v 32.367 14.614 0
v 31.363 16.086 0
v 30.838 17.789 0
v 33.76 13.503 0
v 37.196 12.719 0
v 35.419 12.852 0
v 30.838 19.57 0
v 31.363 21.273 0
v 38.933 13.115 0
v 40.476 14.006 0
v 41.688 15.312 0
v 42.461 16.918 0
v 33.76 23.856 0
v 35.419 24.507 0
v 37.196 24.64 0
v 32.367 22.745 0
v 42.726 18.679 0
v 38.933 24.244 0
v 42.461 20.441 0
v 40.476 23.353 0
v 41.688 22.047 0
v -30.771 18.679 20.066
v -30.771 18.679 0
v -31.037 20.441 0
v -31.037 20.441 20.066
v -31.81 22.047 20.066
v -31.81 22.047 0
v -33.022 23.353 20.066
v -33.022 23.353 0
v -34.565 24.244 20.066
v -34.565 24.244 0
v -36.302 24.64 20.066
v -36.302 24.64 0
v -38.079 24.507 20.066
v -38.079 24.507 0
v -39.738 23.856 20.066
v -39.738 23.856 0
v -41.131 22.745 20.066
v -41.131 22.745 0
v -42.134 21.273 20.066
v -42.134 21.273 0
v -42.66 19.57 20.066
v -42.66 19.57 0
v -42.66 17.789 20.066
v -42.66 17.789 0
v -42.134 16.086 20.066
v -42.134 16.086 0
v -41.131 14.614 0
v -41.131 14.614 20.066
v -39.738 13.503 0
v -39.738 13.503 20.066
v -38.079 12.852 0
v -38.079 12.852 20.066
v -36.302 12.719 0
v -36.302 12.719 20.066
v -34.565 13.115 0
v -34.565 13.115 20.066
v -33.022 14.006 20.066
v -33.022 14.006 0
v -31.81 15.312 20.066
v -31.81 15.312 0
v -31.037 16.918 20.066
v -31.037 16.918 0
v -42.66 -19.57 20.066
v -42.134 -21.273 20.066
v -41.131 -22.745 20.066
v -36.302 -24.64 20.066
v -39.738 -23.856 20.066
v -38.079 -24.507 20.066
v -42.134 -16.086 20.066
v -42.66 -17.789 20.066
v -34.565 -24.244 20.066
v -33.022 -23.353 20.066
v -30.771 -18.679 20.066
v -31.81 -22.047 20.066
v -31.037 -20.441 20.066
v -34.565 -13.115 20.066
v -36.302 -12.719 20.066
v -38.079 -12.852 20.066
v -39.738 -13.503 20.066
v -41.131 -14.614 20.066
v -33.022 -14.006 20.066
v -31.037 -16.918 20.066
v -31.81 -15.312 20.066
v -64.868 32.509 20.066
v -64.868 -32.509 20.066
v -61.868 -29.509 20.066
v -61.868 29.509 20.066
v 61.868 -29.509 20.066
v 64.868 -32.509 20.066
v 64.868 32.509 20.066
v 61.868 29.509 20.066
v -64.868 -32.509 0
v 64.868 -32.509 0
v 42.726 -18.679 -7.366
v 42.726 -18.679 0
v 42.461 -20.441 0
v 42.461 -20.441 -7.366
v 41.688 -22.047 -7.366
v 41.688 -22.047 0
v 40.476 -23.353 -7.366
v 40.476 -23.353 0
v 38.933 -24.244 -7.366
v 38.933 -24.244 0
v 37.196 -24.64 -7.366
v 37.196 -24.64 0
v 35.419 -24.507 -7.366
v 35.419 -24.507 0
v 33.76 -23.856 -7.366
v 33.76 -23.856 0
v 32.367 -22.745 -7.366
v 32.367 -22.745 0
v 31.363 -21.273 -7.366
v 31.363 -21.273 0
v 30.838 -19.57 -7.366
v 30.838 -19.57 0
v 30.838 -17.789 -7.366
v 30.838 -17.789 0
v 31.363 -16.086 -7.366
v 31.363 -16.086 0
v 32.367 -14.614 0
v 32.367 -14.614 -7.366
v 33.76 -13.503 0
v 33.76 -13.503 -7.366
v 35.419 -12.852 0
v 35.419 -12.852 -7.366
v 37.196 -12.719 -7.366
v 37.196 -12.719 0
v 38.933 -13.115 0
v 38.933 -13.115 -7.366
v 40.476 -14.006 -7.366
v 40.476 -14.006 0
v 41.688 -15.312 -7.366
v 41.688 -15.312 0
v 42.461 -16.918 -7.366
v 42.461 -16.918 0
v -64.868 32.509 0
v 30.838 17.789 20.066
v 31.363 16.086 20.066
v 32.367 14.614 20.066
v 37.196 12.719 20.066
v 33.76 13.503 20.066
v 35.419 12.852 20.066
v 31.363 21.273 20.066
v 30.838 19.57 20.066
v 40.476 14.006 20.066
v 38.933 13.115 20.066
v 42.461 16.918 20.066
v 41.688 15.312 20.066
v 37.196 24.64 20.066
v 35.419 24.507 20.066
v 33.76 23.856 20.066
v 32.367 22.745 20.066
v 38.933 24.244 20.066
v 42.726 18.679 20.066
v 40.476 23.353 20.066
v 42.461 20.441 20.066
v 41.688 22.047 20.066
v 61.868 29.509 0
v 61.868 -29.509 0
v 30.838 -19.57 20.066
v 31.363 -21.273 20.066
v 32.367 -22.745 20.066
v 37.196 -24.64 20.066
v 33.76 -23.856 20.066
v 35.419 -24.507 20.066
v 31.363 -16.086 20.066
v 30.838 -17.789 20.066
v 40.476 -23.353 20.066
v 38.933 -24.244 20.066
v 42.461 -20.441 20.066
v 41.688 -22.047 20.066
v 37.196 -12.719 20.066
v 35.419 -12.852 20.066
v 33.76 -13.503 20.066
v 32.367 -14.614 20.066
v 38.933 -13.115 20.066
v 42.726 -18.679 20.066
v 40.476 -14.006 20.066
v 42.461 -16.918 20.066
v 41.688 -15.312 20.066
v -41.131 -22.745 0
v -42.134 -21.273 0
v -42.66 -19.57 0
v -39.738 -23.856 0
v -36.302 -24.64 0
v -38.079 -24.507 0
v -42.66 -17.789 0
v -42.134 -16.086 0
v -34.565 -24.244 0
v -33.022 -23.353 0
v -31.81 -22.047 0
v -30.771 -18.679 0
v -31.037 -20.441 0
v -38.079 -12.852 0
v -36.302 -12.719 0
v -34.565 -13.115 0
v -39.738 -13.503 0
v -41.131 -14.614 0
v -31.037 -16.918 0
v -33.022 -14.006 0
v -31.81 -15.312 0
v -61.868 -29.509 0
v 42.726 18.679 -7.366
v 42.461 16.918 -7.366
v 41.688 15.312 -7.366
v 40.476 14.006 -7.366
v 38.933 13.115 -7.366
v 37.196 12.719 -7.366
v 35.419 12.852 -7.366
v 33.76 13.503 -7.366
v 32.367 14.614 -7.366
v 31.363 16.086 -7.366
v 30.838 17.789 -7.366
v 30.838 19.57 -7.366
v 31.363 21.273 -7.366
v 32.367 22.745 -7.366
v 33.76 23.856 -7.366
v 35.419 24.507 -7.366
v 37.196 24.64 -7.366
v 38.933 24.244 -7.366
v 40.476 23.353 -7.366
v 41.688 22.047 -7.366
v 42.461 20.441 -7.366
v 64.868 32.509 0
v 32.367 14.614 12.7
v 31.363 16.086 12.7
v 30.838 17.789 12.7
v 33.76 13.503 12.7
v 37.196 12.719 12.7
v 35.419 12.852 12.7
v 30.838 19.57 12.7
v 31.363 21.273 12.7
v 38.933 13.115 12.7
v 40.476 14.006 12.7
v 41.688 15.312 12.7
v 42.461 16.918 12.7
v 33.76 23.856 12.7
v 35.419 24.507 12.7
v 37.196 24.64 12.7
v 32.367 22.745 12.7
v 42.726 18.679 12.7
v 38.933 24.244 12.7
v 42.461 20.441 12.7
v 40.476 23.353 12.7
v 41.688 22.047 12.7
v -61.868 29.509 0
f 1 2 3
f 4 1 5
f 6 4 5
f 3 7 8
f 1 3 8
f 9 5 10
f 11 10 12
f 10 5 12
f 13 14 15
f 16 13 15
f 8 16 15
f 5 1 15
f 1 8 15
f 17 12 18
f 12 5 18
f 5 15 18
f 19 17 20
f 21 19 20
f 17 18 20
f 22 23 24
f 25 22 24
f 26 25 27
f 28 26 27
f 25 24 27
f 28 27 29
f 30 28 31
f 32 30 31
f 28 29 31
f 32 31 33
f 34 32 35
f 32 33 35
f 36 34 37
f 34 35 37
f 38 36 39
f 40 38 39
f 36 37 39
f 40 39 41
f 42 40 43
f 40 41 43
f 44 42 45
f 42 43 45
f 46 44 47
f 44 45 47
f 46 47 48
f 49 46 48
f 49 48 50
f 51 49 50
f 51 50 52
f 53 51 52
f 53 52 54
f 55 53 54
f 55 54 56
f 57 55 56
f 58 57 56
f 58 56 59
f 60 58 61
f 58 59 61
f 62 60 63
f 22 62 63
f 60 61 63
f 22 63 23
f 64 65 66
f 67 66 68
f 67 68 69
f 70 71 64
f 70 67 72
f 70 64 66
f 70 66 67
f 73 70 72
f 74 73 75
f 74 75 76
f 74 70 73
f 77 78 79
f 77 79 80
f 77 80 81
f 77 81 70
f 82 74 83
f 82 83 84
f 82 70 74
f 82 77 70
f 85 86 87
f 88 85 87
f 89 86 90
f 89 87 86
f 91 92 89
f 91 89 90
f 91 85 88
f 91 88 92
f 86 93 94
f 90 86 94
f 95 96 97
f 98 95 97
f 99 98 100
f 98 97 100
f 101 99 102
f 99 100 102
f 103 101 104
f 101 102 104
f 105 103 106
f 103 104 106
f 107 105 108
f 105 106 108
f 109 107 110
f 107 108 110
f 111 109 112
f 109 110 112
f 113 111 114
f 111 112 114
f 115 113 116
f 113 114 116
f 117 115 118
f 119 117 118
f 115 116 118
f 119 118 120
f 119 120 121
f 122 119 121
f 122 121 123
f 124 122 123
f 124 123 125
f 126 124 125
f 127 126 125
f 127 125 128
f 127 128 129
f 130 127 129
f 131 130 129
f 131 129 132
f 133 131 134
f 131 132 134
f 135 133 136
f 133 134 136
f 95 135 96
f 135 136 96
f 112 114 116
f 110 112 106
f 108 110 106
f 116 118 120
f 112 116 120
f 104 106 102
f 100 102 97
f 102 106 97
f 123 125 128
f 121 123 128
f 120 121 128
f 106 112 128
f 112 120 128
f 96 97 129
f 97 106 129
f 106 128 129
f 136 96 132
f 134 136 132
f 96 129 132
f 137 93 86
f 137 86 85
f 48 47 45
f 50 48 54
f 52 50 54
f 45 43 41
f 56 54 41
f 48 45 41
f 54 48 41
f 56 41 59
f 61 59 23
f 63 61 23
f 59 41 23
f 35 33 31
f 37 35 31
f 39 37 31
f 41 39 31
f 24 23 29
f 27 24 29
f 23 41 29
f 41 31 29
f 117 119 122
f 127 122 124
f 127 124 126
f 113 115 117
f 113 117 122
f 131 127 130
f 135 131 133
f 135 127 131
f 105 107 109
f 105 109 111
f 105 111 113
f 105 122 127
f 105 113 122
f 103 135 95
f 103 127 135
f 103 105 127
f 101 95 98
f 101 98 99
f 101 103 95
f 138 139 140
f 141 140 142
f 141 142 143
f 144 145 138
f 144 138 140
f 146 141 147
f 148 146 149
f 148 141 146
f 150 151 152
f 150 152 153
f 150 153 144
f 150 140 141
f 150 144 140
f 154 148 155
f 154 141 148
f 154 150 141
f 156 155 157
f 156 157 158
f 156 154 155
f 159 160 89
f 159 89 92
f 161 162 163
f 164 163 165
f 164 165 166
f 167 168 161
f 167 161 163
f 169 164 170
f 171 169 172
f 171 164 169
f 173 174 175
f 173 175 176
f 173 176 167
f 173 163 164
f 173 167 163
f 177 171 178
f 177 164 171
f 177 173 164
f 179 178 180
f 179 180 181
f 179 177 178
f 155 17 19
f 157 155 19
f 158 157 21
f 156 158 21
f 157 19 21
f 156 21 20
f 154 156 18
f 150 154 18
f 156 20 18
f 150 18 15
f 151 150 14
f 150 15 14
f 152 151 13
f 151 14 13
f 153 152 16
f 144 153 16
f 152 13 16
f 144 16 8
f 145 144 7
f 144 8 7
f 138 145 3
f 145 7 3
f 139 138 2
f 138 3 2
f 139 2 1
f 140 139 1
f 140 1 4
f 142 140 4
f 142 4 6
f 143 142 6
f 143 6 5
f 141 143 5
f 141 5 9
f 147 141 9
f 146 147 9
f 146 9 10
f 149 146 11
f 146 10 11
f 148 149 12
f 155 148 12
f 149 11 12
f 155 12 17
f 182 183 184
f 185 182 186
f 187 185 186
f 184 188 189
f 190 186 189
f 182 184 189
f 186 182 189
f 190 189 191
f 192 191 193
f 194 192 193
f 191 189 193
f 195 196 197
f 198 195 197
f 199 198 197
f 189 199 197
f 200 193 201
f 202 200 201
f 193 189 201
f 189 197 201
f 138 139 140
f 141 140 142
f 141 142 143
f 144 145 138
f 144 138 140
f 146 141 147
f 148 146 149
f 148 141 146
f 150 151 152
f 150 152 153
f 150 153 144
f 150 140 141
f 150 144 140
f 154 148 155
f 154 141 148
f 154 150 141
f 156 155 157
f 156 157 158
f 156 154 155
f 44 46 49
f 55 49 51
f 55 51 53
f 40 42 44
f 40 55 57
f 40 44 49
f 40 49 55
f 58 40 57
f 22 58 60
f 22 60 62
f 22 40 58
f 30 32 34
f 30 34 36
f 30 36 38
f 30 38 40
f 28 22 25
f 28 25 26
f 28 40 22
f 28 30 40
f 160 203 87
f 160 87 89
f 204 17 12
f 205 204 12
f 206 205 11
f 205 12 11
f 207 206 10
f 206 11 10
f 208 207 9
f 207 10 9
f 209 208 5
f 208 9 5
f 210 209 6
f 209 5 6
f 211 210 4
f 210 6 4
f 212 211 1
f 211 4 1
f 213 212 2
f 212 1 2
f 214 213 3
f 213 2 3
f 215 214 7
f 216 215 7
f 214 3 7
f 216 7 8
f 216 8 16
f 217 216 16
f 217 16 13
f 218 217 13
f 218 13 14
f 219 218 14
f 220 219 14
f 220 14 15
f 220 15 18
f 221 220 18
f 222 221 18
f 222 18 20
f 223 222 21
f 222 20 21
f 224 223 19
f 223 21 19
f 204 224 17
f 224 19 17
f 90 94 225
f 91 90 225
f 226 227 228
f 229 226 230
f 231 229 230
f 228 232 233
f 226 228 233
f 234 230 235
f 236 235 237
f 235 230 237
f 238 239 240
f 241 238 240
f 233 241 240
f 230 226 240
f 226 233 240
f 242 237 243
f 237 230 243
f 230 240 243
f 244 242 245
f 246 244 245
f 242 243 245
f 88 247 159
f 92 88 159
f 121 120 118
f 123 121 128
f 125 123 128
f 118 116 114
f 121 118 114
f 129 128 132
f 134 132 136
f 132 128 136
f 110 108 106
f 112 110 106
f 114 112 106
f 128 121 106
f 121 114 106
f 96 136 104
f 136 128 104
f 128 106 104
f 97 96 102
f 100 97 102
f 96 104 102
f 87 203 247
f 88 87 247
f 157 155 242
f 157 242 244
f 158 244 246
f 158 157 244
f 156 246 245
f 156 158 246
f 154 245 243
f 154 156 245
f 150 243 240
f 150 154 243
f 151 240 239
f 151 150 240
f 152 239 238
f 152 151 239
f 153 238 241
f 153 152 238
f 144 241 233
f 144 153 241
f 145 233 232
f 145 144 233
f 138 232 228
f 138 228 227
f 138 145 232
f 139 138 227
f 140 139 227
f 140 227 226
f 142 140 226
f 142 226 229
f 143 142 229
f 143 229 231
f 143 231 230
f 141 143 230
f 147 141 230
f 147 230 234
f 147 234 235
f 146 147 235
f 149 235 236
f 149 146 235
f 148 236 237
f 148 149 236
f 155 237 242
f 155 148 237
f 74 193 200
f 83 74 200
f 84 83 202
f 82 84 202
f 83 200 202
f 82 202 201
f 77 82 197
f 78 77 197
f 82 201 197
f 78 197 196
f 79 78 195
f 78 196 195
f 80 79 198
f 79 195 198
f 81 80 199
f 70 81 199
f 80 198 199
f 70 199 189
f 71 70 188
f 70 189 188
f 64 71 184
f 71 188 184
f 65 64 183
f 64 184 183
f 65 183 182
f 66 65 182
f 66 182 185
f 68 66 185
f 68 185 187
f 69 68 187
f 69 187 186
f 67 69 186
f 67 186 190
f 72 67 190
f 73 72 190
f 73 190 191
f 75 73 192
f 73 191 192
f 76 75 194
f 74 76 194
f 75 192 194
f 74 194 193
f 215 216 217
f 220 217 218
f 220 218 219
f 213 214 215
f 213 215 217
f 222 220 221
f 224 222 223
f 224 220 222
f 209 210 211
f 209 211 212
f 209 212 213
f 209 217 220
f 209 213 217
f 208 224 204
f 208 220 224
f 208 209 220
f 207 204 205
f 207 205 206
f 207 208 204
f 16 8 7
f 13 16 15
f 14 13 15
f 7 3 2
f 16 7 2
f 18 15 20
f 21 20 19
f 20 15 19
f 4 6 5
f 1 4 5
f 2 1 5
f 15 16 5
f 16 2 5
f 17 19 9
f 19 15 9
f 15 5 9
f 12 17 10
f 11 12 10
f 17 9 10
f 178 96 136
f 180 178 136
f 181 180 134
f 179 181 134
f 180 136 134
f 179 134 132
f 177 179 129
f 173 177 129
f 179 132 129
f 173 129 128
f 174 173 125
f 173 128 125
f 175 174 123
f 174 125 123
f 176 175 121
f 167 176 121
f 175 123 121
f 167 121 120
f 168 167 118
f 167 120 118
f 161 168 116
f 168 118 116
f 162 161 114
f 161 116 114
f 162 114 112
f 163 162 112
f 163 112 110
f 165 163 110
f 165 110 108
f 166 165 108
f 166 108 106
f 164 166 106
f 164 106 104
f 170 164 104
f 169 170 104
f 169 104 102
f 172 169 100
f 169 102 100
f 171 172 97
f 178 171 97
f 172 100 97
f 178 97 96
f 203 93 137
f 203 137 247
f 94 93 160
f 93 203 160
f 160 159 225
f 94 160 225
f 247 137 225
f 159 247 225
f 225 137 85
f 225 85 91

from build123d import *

# Parameters (mm, degrees)
F0_R       = 5.9775161225
F1_DEPTH   = 20.066
F0_W       = 129.7355321646
F0_H       = 65.0189756741
F0_W_2     = 123.7355321646
F0_H_2     = 59.0189756741
F1_FACE_R  = 5.9775161225
F1_FACE1_R = 5.9775161225
F2_DEPTH   = 7.366


with BuildPart() as f1:
    # F0 (on Top) → F1 (new body)
    with BuildSketch(Plane.XY):
        with Locations((36.7489270866, -18.6794780054)):
            Circle(F0_R)
    extrude(amount=F1_DEPTH)


with BuildPart() as f1b:
    # F0 (on Top) → F1, piece 2 (new body)
    with BuildSketch(Plane.XY):
        with Locations((-36.7489270866, -18.6794780054)):
            Circle(F0_R)
    extrude(amount=F1_DEPTH)


with BuildPart() as f1c:
    # F0 (on Top) → F1, piece 3 (new body)
    with BuildSketch(Plane.XY):
        with Locations((36.7489270866, 18.6794780054)):
            Circle(F0_R)
    extrude(amount=F1_DEPTH)


with BuildPart() as f1d:
    # F0 (on Top) → F1, piece 4 (new body)
    with BuildSketch(Plane.XY):
        Rectangle(F0_W, F0_H)
        Rectangle(F0_W_2, F0_H_2, mode=Mode.SUBTRACT)
    extrude(amount=F1_DEPTH)


with BuildPart() as f1e:
    # F0 (on Top) → F1, piece 5 (new body)
    with BuildSketch(Plane.XY):
        with Locations((-36.7489270866, 18.6794780054)):
            Circle(F0_R)
    extrude(amount=F1_DEPTH)


with BuildPart() as f2:
    # F1_face (on face) + F1_face1 (on face) → F2 (new body)
    with BuildSketch(Plane(origin=(36.7489270866, -18.6794780054, 0), x_dir=(1, 0, 0), z_dir=(0, 0, -1))):
        Circle(F1_FACE_R)
        with Locations((0, -37.3589560108)):
            Circle(F1_FACE_R)
    with BuildSketch(Plane(origin=(36.7489270866, 18.6794780054, 20.066), x_dir=(1, 0, 0), z_dir=(0, 0, 1))):
        Circle(F1_FACE1_R)
    extrude(amount=F2_DEPTH, dir=(0, 0, -1))


solid = Compound([f1.part, f1b.part, f1c.part, f1d.part, f1e.part, f2.part])
